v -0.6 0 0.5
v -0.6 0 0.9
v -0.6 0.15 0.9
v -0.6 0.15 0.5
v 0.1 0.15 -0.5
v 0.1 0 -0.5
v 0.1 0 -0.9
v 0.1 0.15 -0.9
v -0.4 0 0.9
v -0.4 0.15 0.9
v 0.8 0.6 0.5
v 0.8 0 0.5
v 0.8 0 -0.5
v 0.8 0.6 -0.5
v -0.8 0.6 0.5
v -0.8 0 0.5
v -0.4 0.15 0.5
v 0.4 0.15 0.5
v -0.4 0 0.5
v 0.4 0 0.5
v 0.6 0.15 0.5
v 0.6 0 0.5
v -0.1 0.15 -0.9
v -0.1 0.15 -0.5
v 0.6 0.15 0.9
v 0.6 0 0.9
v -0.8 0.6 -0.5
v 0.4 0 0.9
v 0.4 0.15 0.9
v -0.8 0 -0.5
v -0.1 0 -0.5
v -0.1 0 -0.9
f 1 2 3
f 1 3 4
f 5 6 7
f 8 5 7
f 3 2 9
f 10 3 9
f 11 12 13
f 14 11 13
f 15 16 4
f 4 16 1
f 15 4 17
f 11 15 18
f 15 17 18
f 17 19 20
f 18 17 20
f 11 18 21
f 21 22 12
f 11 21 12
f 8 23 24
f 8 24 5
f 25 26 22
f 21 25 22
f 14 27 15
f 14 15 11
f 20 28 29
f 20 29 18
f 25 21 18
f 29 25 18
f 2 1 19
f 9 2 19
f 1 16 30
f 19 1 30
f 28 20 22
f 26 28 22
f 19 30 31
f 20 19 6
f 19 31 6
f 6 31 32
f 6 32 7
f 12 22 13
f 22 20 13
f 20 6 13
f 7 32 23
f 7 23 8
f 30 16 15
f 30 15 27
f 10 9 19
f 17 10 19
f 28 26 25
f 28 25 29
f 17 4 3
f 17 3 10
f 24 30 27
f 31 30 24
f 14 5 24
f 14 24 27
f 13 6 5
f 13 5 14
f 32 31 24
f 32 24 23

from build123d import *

# Parameters (mm, degrees)
BASES_W       = 1.6
BASES_H       = 1
BASE_DEPTH    = 0.6
LEGS_W        = 0.2
LEGS_H        = 0.4
LEG_DEPTH     = 0.15
SIDELEGS_W    = 0.2
SIDELEGS_H    = 0.4
SIDELEG_DEPTH = 0.15


with BuildPart() as part:
    # BaseS → Base (new body)
    with BuildSketch(Plane(origin=(0, 0, 0), x_dir=(1, 0, 0), z_dir=(0, 1, 0))):
        Rectangle(BASES_W, BASES_H)
    extrude(amount=BASE_DEPTH)

    # LegS → Leg (add)
    with BuildSketch(Plane(origin=(0, 0, 0), x_dir=(1, 0, 0), z_dir=(0, 1, 0))):
        with Locations((0, 0.7)):
            Rectangle(LEGS_W, LEGS_H)
    extrude(amount=LEG_DEPTH)

    # SideLegS → SideLeg (add)
    with BuildSketch(Plane(origin=(0, 0, 0), x_dir=(1, 0, 0), z_dir=(0, 1, 0))):
        with Locations((-0.5, -0.7)):
            Rectangle(SIDELEGS_W, SIDELEGS_H)
    sideleg = extrude(amount=SIDELEG_DEPTH)

    # SLHM: SideLeg across plane
    add(sideleg.mirror(Plane(origin=(0, 0, 0), x_dir=(0, 0, 1), z_dir=(1, 0, 0))))


solid = part.part
